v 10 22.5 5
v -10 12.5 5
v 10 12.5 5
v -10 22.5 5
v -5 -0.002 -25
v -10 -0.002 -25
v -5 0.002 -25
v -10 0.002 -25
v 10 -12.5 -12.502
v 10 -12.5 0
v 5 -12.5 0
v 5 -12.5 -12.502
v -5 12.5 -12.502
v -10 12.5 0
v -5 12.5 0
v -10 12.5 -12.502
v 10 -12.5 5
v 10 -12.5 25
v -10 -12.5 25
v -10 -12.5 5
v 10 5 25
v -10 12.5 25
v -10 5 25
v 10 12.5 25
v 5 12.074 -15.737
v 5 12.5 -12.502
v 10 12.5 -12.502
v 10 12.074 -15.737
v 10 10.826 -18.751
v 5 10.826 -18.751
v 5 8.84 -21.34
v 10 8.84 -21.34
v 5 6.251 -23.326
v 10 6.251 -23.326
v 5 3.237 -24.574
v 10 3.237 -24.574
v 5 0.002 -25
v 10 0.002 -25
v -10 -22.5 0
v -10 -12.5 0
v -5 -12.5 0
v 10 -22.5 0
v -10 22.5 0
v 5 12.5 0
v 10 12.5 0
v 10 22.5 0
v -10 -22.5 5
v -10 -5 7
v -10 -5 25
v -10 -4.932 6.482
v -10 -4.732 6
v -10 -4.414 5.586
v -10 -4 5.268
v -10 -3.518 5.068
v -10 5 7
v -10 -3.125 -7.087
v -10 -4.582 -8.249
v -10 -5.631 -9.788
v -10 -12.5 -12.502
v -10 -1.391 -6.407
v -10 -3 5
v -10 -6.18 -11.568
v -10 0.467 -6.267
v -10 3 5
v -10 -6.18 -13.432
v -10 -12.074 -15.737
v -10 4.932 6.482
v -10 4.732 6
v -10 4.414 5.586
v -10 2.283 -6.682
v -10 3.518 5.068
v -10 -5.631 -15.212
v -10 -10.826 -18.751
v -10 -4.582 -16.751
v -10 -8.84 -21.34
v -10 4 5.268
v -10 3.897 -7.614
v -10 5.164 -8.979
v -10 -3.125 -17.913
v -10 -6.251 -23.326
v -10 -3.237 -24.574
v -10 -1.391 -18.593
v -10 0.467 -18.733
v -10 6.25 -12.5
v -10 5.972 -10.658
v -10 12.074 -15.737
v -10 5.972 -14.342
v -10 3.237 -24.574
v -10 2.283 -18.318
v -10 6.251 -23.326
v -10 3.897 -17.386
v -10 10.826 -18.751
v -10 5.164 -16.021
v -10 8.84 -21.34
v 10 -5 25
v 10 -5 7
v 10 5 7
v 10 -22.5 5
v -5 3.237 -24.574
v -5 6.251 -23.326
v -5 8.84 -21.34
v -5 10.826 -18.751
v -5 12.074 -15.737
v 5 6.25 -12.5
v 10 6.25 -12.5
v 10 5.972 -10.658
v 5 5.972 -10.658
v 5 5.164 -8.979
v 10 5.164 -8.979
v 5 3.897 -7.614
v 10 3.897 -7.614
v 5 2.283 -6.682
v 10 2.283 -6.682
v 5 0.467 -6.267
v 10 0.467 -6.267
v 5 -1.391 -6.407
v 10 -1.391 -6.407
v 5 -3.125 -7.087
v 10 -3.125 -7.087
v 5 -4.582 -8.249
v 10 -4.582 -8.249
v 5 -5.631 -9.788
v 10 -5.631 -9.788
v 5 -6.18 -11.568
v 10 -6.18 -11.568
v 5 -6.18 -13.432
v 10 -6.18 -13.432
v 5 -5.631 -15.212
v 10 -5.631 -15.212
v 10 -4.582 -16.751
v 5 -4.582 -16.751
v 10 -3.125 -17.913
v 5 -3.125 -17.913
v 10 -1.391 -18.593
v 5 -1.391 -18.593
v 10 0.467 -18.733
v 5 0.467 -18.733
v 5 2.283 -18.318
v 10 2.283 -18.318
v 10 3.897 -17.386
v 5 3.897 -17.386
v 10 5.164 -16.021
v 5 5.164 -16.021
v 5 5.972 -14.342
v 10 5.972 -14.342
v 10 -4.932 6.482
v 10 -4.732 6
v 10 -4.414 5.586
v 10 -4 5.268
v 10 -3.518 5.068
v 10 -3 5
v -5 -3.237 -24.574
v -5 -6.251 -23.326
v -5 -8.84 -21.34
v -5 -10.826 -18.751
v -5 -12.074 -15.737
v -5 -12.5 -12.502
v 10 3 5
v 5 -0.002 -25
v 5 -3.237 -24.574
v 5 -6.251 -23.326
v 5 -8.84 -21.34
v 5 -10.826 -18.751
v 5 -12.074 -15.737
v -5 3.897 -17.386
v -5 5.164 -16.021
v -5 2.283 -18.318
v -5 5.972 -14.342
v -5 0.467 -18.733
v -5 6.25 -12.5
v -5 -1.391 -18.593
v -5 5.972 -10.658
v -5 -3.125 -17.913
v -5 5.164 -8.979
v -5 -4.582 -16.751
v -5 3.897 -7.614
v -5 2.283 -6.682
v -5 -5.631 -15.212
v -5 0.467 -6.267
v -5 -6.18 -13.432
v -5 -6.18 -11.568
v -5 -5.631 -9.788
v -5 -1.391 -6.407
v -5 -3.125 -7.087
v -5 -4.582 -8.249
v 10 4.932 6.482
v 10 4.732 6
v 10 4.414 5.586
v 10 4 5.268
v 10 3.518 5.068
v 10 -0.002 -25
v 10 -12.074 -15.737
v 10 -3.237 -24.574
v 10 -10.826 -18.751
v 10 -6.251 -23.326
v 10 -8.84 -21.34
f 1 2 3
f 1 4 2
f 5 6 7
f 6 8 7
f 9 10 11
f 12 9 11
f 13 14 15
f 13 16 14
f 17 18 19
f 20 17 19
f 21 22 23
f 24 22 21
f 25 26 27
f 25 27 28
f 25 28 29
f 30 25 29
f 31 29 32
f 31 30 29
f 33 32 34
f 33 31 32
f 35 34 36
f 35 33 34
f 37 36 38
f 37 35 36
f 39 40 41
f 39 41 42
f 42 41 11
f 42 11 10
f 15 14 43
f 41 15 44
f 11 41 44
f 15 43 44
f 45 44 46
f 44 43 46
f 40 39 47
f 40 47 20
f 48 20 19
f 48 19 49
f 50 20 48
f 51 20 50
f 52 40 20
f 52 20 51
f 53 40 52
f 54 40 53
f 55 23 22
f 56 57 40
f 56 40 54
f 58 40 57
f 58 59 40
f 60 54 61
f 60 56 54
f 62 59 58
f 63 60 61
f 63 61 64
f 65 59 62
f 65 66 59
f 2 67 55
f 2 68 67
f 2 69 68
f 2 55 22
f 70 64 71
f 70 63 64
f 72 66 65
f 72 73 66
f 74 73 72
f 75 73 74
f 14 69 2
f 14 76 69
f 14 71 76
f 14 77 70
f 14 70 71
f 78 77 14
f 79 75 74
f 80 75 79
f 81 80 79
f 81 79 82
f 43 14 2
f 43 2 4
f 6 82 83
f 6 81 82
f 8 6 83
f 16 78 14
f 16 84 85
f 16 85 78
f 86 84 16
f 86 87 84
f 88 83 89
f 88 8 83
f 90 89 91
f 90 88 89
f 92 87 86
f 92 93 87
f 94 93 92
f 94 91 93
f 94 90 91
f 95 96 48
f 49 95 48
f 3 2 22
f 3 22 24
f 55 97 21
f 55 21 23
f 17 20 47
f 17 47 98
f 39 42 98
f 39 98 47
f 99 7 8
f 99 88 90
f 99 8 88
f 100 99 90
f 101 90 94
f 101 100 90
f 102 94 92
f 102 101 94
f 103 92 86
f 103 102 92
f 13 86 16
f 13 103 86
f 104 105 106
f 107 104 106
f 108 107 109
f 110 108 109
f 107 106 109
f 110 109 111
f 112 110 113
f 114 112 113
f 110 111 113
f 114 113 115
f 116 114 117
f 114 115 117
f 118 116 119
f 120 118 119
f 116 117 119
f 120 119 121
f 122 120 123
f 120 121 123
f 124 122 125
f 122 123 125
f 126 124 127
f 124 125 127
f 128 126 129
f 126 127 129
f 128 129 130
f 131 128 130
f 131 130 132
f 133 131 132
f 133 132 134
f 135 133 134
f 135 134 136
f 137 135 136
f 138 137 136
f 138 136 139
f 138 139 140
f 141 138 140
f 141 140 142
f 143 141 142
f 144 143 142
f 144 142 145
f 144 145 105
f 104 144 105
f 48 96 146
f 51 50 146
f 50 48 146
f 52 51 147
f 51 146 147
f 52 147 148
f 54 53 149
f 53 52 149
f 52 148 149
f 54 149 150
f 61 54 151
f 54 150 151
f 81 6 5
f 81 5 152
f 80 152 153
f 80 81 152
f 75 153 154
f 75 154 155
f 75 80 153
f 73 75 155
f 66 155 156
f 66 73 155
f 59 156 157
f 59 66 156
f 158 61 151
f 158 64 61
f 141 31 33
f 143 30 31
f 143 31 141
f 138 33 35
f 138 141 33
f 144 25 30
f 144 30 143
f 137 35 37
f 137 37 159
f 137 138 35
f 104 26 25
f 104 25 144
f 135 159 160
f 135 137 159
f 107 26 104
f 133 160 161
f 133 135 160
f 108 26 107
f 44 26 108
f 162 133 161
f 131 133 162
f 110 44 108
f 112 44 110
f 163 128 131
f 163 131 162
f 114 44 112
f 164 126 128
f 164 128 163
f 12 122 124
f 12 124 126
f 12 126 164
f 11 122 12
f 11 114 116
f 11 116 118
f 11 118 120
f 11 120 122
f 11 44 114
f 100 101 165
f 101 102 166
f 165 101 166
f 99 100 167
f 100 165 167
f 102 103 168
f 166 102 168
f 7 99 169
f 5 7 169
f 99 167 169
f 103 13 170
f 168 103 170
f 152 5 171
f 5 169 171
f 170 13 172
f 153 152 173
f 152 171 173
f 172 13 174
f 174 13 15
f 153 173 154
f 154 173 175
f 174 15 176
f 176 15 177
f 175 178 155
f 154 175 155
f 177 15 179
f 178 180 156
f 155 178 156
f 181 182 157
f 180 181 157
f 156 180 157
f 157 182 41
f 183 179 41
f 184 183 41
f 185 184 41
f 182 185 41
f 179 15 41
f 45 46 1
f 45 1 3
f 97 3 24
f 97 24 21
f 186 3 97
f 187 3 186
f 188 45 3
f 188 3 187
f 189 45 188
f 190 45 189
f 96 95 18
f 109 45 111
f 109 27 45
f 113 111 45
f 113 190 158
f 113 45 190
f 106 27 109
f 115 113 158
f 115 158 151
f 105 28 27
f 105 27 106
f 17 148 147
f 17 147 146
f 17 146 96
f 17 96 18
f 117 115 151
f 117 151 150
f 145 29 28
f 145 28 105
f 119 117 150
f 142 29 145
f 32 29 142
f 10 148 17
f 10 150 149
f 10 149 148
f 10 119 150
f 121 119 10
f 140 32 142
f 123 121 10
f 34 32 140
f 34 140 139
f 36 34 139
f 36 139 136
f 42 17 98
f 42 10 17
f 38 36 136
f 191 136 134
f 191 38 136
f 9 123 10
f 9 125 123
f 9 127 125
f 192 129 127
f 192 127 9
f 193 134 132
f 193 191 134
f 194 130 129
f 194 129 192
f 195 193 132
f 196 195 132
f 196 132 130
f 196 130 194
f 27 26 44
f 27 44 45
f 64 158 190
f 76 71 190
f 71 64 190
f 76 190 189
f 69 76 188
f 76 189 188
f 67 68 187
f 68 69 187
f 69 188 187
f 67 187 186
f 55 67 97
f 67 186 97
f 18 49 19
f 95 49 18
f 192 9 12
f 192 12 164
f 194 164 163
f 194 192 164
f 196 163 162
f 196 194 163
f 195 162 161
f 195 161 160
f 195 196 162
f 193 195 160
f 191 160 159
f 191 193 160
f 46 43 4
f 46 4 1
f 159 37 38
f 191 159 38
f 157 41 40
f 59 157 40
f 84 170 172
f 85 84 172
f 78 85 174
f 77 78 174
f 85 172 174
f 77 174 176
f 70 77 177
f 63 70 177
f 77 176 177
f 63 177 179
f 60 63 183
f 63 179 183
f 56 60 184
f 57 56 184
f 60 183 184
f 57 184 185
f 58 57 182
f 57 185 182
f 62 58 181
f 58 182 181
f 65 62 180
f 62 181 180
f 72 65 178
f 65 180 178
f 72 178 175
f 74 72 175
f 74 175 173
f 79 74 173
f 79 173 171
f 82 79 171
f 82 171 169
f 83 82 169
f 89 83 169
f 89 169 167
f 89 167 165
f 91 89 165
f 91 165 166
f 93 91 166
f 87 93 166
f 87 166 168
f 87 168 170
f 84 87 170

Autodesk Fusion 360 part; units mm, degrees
sketch "Sketch1" plane through (0, 0, 0) normal (0, 0, 1) x (1, 0, 0)
  line L0 (-10, 22.5) -> (10, 22.5)
  line L1 (10, 22.5) -> (10, -22.5)
  line L2 (10, -22.5) -> (-10, -22.5)
  line L3 (-10, -22.5) -> (-10, 22.5)
  line L4 (10, 12.5) -> (5, 12.5)
  line L5 (5, 12.5) -> (5, -12.5)
  line L6 (5, -12.5) -> (10, -12.5)
  line L7 (10, -12.5) -> (10, 12.5)
  line L8 (0, 22.5) -> (0, -22.5)
  line L9 (-10, 22.5) -> (-10, -22.5)
  line L10 (-10, -12.5) -> (-10, 12.5)
  line L11 (-5, -12.5) -> (-10, -12.5)
  line L12 (-5, 12.5) -> (-5, -12.5)
  line L13 (-10, 0) -> (10, 0)
  line L14 (-10, 12.5) -> (10, 12.5)
  line L15 (10, 12.5) -> (10, 5)
  line L16 (10, 5) -> (-10, 5)
  line L17 (-10, 5) -> (-10, 12.5)
  line L18 (10, -5) -> (-10, -5)
  line L19 (-10, -12.5) -> (10, -12.5)
  dimension "d1" = 20
  dimension "d2" = 45
  dimension "d3" = 22.5
  dimension "d4" = 10
  dimension "d5" = 5
  dimension "d6" = 25
  dimension "d7" = 12.5
  dimension "d8" = 7.5
  dimension "d9" = 10
extrude "Extrude1" add sketch "Sketch1" along normal blind 25 contours L3 L9 L10 L12 L14 L16 L17 | L5 L8 L14 L16 | L8 L12 L14 L16 | L1 L4 L5 L7 L14 L15 L16 | L3 L9 L10 L11 L12 L18 L19 | L5 L8 L18 L19 | L8 L12 L18 L19 | L1 L5 L6 L7 L18 L19 makes body 1 at (-3.3333, 12.5, 8.3333) makes body 2 at (3.3333, -5, 8.3333)
extrude "Extrude2" add sketch "Sketch1" against normal blind 25 contours L3 L9 L10 L12 L14 L16 L17 | L3 L9 L10 L12 L13 L16 | L1 L4 L5 L7 L14 L15 L16 | L3 L9 L10 L12 L13 L18 | L1 L5 L7 L13 L16 | L3 L9 L10 L11 L12 L18 L19 | L1 L5 L7 L13 L18 | L1 L5 L6 L7 L18 L19 bodies 1 2
extrude "Extrude3" add sketch "Sketch1" along normal blind 5 contours L0 L3 L8 L9 L14 | L0 L1 L4 L8 L14 | L3 L9 L10 L12 L13 L16 | L5 L8 L13 L16 | L8 L12 L13 L16 | L3 L9 L10 L12 L13 L18 | L1 L5 L7 L13 L16 | L5 L8 L13 L18 | L8 L12 L13 L18 | L1 L5 L7 L13 L18 | L2 L3 L8 L9 L11 L19 | L1 L2 L6 L8 L19 bodies 1
fillet "Fillet1" radius 12.5 4 edges at (7.5, -12.5, -25) (-7.5, -12.5, -25) (-7.5, 12.5, -25) (7.5, 12.5, -25) on bodies 1
fillet "Fillet2" radius 2 2 edges at (0, -5, 5) (0, 5, 5) on bodies 1
sketch "Sketch2" plane through (10, 0, 0) normal (1, 0, 0) x (0, 1, 0)
  arc A0 (-12.5, -12.5) -> (12.5, -12.5) centre (0, -12.5) ccw
  line L0 (12.5, -12.5) -> (12.5, 0)
  line L1 (12.5, 0) -> (22.5, 0)
  line L2 (22.5, 0) -> (22.5, 5)
  line L3 (22.5, 5) -> (12.5, 5)
  line L4 (12.5, 5) -> (12.5, 25)
  line L5 (12.5, 25) -> (5, 25)
  line L6 (5, 25) -> (5, 7)
  arc A1 (3, 5) -> (5, 7) centre (3, 7) ccw
  line L7 (3, 5) -> (-3, 5)
  arc A2 (-5, 7) -> (-3, 5) centre (-3, 7) ccw
  line L8 (-5, 7) -> (-5, 25)
  line L9 (-5, 25) -> (-12.5, 25)
  line L10 (-12.5, 25) -> (-12.5, 5)
  line L11 (-12.5, 5) -> (-22.5, 5)
  line L12 (-22.5, 5) -> (-22.5, 0)
  line L13 (-22.5, 0) -> (-12.5, 0)
  line L14 (-12.5, 0) -> (-12.5, -12.5)
  circle A3 centre (0, -12.5) radius 6.25
  dimension "d20" = 12.5
  dimension "d21" = 12.5
extrude "Extrude4" cut sketch "Sketch2" against normal up to surface (20 mm away) contours A3 bodies 1
equation "d3 = ( 45 / 2 ) * 1 mm"
equation "d7 = ( 25 / 2 ) * 1 mm"
equation "d8 = ( 15 / 2 ) * 1 mm"
